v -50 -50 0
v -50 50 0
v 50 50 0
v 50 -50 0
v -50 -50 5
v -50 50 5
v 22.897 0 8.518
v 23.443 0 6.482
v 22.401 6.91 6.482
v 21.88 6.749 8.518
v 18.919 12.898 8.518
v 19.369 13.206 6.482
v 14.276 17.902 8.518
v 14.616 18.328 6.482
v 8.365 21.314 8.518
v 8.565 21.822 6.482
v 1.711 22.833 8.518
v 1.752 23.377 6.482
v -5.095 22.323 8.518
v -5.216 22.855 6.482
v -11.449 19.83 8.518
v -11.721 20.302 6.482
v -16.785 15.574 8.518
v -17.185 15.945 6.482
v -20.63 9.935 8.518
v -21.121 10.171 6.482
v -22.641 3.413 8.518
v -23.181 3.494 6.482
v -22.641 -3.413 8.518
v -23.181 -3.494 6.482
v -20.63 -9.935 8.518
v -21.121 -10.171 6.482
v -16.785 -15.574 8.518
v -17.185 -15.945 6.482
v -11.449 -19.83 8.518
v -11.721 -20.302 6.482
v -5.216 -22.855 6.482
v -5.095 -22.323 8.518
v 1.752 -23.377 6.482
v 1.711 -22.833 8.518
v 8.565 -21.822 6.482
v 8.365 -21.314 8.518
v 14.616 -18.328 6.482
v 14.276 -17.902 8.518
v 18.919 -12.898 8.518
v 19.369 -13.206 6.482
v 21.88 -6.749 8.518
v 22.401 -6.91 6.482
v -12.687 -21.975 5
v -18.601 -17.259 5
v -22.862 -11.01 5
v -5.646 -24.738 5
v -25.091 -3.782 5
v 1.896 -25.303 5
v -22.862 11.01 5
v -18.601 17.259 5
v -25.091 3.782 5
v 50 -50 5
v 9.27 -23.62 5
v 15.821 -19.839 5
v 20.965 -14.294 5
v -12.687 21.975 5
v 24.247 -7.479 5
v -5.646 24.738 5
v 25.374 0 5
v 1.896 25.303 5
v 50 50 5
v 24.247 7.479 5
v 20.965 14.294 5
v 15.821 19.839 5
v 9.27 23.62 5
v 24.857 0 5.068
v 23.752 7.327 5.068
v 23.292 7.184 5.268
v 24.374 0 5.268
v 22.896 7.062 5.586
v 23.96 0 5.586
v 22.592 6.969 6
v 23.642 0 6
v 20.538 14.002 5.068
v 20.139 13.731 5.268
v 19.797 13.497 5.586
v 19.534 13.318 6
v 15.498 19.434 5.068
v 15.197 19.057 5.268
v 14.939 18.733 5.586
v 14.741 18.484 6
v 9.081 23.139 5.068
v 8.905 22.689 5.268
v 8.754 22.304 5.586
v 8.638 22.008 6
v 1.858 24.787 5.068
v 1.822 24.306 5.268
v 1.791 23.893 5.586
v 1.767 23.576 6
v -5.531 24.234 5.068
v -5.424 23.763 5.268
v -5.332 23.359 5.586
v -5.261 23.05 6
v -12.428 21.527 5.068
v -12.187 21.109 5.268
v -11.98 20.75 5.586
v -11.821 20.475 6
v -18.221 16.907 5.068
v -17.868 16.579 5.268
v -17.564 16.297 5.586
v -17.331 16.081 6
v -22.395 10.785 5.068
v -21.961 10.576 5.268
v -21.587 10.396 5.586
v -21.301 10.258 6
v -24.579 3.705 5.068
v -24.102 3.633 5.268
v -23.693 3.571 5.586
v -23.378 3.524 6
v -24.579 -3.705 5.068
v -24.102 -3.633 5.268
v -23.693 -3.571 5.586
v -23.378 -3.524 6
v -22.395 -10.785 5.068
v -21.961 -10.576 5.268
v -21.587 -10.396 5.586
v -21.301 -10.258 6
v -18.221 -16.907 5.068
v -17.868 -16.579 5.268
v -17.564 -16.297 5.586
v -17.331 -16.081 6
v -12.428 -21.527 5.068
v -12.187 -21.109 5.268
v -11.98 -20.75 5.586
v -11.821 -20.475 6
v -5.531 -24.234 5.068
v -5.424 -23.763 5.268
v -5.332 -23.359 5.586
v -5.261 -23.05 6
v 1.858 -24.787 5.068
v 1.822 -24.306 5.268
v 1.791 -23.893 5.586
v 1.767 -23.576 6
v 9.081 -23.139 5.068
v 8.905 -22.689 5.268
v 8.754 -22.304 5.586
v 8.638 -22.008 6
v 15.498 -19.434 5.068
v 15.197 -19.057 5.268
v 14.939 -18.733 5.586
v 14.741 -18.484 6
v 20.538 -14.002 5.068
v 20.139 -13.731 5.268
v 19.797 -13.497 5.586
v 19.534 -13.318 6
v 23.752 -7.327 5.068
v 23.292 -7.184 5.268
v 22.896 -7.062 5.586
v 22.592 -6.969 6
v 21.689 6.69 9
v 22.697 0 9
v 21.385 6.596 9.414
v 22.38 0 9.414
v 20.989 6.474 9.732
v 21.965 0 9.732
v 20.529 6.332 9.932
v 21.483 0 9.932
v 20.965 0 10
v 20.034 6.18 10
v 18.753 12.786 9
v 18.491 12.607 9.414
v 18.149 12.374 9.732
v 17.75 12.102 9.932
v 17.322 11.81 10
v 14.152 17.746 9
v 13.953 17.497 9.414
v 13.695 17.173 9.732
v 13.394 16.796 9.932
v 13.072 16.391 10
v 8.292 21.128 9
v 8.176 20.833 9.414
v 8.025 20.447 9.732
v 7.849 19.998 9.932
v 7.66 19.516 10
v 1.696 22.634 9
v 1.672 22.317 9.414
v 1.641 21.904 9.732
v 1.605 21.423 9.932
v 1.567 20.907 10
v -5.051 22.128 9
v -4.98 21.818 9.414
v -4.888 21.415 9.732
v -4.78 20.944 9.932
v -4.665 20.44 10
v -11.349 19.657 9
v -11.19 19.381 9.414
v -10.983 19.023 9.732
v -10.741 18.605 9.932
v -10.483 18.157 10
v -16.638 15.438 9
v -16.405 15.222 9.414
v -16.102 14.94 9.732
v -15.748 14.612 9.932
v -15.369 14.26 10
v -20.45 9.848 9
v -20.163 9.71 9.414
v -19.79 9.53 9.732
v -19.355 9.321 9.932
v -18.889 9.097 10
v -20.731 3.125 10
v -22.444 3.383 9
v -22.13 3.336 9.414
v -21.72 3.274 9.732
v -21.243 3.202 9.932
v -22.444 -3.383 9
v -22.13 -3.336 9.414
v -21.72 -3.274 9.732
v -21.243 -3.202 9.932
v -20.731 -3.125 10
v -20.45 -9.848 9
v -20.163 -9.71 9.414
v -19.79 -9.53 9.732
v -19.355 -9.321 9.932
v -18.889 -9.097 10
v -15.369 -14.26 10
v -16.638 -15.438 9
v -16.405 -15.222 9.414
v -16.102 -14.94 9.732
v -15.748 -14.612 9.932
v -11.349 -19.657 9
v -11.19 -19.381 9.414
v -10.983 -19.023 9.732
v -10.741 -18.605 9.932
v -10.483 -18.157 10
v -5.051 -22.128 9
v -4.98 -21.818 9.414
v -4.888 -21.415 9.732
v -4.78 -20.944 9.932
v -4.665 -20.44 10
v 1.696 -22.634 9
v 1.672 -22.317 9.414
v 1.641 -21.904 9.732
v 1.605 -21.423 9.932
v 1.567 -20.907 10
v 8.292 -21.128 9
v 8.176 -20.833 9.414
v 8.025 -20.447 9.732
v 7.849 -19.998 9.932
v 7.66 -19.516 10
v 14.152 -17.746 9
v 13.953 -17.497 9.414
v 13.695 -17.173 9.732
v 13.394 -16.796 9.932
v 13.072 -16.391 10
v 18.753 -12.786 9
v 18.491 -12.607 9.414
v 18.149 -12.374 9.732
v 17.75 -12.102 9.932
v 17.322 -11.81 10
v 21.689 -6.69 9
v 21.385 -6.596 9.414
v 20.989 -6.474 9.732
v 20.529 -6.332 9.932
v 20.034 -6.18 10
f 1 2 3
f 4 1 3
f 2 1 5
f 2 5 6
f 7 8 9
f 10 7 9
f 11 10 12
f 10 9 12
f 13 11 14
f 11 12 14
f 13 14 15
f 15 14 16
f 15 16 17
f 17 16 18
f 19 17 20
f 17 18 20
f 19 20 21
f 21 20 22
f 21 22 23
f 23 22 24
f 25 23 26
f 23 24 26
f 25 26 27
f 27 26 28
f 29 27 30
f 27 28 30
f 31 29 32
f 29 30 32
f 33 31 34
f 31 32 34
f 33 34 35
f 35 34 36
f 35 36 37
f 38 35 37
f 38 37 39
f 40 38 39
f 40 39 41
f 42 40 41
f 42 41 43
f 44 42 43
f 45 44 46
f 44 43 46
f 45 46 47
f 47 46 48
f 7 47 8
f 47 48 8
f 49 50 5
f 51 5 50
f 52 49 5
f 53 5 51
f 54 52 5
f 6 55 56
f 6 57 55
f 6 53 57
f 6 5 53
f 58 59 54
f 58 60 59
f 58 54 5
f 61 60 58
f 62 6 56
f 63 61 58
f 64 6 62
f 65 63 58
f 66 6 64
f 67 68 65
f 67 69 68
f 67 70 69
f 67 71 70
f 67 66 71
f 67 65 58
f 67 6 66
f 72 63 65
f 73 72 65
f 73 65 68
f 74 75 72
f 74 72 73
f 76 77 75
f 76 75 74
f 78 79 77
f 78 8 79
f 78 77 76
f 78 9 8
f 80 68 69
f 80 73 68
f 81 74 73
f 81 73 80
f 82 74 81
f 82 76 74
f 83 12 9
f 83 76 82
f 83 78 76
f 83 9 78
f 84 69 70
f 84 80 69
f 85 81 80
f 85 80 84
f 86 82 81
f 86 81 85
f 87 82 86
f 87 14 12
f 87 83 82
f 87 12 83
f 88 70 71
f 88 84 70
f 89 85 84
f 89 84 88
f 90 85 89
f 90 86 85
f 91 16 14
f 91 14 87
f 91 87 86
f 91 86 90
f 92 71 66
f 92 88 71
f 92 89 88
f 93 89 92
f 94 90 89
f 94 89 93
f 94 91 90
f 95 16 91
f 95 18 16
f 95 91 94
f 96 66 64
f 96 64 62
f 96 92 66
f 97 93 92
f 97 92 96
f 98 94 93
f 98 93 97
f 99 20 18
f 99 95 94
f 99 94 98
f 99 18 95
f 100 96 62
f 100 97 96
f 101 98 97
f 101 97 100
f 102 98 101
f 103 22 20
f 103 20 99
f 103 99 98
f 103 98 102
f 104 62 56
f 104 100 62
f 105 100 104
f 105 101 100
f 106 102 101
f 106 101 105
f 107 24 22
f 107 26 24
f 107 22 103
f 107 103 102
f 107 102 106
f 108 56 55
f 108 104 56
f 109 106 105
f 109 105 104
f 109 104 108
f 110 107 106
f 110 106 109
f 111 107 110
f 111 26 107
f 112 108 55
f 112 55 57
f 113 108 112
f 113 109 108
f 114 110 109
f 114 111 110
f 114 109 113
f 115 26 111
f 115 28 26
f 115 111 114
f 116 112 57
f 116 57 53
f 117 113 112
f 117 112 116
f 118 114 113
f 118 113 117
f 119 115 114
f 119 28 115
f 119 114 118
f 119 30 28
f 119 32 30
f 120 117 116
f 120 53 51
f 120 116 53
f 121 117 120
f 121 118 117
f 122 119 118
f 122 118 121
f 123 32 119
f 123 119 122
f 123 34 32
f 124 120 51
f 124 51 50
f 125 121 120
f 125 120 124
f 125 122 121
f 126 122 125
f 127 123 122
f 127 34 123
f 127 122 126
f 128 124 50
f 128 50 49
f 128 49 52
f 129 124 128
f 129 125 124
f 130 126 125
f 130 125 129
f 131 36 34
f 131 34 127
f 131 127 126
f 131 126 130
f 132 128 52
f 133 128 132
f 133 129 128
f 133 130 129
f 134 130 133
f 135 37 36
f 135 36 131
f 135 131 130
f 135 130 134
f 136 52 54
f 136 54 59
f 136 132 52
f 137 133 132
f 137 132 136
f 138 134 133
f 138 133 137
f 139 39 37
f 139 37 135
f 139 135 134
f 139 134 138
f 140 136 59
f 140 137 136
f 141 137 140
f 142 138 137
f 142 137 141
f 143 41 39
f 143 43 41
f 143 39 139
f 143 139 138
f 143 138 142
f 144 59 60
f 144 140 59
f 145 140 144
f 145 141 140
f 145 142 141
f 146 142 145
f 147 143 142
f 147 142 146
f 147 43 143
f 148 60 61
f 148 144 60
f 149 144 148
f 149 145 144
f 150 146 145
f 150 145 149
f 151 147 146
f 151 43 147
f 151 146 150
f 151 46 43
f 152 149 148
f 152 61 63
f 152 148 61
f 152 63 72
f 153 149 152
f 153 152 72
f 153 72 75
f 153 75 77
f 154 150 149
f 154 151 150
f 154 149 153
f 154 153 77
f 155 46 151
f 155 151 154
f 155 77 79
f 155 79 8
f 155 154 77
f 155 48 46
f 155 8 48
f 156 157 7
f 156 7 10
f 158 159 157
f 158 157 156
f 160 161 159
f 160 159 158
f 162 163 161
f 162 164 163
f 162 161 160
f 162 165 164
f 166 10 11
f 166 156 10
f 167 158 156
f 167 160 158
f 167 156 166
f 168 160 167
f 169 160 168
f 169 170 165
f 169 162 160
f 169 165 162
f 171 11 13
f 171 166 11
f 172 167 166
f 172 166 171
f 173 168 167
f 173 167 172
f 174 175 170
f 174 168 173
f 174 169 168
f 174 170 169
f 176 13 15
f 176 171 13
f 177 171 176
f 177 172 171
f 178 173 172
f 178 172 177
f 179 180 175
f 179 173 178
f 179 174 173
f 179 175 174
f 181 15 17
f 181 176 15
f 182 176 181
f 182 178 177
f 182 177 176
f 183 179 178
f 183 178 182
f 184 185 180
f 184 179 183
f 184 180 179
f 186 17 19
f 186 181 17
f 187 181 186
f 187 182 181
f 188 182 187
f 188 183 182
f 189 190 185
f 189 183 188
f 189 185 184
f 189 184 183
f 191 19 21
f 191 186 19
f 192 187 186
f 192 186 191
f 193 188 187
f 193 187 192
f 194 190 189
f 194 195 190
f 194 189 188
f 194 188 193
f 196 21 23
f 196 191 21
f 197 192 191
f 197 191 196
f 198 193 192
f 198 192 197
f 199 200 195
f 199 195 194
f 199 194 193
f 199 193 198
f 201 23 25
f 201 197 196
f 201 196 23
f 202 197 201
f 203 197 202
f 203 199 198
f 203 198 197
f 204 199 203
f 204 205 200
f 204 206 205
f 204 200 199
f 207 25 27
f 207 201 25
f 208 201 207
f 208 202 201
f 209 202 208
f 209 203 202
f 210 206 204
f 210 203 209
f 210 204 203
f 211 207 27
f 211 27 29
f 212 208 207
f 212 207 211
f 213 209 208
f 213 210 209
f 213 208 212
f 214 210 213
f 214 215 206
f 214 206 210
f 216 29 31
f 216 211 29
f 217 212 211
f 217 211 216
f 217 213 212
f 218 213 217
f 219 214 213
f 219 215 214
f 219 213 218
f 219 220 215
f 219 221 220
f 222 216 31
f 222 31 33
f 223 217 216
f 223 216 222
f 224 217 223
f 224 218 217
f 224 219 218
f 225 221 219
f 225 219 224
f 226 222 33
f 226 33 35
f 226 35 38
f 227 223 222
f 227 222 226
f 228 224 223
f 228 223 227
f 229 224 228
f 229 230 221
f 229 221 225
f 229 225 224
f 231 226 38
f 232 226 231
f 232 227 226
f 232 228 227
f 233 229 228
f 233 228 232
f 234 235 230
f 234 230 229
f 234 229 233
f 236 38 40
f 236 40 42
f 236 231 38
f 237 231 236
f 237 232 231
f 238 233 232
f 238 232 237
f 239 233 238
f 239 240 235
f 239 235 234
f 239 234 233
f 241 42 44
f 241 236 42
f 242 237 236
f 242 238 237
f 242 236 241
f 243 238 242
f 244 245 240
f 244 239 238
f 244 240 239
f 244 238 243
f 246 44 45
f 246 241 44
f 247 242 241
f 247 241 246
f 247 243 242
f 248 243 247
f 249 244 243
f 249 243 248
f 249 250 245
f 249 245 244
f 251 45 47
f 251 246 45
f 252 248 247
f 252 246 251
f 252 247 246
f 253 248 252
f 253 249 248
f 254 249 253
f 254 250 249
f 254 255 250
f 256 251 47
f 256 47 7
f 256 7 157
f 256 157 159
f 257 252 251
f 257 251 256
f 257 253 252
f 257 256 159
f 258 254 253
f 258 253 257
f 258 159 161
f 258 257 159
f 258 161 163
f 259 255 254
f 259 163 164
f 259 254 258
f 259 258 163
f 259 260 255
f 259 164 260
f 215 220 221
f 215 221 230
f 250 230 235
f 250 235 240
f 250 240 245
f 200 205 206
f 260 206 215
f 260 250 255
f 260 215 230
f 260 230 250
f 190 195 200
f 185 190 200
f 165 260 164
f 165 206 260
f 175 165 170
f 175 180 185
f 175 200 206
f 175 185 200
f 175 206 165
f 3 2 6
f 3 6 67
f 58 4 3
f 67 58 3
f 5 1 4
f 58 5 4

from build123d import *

# Parameters (mm, degrees)
SKETCH_1_W      = 100
SKETCH_1_H      = 100
EXTRUDE_1_DEPTH = 5
SKETCH_2_R      = 22.5
EXTRUDE_2_DEPTH = 5
DRAFT_1_ANGLE   = 15
FILLET_1_R      = 2


with BuildPart() as part:
    # 草图1 → 凸台-拉伸1 (new body)
    with BuildSketch(Plane.XY):
        Rectangle(SKETCH_1_W, SKETCH_1_H)
    extrude(amount=EXTRUDE_1_DEPTH)

    # 草图2 → 凸台-拉伸2 (add)
    with BuildSketch(Plane.XY.offset(5)):
        Circle(SKETCH_2_R)
    extrude(amount=EXTRUDE_2_DEPTH)

    # 拔模1
    draft_1_faces = [part.faces().sort_by_distance(p)[0] for p in [
        (-22.5, 0, 7.5),
    ]]
    draft(draft_1_faces, Plane.XY.offset(10), DRAFT_1_ANGLE)

    # 圆角1
    fillet_1_edges = [part.edges().sort_by_distance(p)[0] for p in [
        (-23.839745962, 0, 5),
        (-22.5, 0, 10),
    ]]
    fillet(fillet_1_edges, radius=FILLET_1_R)


solid = part.part
